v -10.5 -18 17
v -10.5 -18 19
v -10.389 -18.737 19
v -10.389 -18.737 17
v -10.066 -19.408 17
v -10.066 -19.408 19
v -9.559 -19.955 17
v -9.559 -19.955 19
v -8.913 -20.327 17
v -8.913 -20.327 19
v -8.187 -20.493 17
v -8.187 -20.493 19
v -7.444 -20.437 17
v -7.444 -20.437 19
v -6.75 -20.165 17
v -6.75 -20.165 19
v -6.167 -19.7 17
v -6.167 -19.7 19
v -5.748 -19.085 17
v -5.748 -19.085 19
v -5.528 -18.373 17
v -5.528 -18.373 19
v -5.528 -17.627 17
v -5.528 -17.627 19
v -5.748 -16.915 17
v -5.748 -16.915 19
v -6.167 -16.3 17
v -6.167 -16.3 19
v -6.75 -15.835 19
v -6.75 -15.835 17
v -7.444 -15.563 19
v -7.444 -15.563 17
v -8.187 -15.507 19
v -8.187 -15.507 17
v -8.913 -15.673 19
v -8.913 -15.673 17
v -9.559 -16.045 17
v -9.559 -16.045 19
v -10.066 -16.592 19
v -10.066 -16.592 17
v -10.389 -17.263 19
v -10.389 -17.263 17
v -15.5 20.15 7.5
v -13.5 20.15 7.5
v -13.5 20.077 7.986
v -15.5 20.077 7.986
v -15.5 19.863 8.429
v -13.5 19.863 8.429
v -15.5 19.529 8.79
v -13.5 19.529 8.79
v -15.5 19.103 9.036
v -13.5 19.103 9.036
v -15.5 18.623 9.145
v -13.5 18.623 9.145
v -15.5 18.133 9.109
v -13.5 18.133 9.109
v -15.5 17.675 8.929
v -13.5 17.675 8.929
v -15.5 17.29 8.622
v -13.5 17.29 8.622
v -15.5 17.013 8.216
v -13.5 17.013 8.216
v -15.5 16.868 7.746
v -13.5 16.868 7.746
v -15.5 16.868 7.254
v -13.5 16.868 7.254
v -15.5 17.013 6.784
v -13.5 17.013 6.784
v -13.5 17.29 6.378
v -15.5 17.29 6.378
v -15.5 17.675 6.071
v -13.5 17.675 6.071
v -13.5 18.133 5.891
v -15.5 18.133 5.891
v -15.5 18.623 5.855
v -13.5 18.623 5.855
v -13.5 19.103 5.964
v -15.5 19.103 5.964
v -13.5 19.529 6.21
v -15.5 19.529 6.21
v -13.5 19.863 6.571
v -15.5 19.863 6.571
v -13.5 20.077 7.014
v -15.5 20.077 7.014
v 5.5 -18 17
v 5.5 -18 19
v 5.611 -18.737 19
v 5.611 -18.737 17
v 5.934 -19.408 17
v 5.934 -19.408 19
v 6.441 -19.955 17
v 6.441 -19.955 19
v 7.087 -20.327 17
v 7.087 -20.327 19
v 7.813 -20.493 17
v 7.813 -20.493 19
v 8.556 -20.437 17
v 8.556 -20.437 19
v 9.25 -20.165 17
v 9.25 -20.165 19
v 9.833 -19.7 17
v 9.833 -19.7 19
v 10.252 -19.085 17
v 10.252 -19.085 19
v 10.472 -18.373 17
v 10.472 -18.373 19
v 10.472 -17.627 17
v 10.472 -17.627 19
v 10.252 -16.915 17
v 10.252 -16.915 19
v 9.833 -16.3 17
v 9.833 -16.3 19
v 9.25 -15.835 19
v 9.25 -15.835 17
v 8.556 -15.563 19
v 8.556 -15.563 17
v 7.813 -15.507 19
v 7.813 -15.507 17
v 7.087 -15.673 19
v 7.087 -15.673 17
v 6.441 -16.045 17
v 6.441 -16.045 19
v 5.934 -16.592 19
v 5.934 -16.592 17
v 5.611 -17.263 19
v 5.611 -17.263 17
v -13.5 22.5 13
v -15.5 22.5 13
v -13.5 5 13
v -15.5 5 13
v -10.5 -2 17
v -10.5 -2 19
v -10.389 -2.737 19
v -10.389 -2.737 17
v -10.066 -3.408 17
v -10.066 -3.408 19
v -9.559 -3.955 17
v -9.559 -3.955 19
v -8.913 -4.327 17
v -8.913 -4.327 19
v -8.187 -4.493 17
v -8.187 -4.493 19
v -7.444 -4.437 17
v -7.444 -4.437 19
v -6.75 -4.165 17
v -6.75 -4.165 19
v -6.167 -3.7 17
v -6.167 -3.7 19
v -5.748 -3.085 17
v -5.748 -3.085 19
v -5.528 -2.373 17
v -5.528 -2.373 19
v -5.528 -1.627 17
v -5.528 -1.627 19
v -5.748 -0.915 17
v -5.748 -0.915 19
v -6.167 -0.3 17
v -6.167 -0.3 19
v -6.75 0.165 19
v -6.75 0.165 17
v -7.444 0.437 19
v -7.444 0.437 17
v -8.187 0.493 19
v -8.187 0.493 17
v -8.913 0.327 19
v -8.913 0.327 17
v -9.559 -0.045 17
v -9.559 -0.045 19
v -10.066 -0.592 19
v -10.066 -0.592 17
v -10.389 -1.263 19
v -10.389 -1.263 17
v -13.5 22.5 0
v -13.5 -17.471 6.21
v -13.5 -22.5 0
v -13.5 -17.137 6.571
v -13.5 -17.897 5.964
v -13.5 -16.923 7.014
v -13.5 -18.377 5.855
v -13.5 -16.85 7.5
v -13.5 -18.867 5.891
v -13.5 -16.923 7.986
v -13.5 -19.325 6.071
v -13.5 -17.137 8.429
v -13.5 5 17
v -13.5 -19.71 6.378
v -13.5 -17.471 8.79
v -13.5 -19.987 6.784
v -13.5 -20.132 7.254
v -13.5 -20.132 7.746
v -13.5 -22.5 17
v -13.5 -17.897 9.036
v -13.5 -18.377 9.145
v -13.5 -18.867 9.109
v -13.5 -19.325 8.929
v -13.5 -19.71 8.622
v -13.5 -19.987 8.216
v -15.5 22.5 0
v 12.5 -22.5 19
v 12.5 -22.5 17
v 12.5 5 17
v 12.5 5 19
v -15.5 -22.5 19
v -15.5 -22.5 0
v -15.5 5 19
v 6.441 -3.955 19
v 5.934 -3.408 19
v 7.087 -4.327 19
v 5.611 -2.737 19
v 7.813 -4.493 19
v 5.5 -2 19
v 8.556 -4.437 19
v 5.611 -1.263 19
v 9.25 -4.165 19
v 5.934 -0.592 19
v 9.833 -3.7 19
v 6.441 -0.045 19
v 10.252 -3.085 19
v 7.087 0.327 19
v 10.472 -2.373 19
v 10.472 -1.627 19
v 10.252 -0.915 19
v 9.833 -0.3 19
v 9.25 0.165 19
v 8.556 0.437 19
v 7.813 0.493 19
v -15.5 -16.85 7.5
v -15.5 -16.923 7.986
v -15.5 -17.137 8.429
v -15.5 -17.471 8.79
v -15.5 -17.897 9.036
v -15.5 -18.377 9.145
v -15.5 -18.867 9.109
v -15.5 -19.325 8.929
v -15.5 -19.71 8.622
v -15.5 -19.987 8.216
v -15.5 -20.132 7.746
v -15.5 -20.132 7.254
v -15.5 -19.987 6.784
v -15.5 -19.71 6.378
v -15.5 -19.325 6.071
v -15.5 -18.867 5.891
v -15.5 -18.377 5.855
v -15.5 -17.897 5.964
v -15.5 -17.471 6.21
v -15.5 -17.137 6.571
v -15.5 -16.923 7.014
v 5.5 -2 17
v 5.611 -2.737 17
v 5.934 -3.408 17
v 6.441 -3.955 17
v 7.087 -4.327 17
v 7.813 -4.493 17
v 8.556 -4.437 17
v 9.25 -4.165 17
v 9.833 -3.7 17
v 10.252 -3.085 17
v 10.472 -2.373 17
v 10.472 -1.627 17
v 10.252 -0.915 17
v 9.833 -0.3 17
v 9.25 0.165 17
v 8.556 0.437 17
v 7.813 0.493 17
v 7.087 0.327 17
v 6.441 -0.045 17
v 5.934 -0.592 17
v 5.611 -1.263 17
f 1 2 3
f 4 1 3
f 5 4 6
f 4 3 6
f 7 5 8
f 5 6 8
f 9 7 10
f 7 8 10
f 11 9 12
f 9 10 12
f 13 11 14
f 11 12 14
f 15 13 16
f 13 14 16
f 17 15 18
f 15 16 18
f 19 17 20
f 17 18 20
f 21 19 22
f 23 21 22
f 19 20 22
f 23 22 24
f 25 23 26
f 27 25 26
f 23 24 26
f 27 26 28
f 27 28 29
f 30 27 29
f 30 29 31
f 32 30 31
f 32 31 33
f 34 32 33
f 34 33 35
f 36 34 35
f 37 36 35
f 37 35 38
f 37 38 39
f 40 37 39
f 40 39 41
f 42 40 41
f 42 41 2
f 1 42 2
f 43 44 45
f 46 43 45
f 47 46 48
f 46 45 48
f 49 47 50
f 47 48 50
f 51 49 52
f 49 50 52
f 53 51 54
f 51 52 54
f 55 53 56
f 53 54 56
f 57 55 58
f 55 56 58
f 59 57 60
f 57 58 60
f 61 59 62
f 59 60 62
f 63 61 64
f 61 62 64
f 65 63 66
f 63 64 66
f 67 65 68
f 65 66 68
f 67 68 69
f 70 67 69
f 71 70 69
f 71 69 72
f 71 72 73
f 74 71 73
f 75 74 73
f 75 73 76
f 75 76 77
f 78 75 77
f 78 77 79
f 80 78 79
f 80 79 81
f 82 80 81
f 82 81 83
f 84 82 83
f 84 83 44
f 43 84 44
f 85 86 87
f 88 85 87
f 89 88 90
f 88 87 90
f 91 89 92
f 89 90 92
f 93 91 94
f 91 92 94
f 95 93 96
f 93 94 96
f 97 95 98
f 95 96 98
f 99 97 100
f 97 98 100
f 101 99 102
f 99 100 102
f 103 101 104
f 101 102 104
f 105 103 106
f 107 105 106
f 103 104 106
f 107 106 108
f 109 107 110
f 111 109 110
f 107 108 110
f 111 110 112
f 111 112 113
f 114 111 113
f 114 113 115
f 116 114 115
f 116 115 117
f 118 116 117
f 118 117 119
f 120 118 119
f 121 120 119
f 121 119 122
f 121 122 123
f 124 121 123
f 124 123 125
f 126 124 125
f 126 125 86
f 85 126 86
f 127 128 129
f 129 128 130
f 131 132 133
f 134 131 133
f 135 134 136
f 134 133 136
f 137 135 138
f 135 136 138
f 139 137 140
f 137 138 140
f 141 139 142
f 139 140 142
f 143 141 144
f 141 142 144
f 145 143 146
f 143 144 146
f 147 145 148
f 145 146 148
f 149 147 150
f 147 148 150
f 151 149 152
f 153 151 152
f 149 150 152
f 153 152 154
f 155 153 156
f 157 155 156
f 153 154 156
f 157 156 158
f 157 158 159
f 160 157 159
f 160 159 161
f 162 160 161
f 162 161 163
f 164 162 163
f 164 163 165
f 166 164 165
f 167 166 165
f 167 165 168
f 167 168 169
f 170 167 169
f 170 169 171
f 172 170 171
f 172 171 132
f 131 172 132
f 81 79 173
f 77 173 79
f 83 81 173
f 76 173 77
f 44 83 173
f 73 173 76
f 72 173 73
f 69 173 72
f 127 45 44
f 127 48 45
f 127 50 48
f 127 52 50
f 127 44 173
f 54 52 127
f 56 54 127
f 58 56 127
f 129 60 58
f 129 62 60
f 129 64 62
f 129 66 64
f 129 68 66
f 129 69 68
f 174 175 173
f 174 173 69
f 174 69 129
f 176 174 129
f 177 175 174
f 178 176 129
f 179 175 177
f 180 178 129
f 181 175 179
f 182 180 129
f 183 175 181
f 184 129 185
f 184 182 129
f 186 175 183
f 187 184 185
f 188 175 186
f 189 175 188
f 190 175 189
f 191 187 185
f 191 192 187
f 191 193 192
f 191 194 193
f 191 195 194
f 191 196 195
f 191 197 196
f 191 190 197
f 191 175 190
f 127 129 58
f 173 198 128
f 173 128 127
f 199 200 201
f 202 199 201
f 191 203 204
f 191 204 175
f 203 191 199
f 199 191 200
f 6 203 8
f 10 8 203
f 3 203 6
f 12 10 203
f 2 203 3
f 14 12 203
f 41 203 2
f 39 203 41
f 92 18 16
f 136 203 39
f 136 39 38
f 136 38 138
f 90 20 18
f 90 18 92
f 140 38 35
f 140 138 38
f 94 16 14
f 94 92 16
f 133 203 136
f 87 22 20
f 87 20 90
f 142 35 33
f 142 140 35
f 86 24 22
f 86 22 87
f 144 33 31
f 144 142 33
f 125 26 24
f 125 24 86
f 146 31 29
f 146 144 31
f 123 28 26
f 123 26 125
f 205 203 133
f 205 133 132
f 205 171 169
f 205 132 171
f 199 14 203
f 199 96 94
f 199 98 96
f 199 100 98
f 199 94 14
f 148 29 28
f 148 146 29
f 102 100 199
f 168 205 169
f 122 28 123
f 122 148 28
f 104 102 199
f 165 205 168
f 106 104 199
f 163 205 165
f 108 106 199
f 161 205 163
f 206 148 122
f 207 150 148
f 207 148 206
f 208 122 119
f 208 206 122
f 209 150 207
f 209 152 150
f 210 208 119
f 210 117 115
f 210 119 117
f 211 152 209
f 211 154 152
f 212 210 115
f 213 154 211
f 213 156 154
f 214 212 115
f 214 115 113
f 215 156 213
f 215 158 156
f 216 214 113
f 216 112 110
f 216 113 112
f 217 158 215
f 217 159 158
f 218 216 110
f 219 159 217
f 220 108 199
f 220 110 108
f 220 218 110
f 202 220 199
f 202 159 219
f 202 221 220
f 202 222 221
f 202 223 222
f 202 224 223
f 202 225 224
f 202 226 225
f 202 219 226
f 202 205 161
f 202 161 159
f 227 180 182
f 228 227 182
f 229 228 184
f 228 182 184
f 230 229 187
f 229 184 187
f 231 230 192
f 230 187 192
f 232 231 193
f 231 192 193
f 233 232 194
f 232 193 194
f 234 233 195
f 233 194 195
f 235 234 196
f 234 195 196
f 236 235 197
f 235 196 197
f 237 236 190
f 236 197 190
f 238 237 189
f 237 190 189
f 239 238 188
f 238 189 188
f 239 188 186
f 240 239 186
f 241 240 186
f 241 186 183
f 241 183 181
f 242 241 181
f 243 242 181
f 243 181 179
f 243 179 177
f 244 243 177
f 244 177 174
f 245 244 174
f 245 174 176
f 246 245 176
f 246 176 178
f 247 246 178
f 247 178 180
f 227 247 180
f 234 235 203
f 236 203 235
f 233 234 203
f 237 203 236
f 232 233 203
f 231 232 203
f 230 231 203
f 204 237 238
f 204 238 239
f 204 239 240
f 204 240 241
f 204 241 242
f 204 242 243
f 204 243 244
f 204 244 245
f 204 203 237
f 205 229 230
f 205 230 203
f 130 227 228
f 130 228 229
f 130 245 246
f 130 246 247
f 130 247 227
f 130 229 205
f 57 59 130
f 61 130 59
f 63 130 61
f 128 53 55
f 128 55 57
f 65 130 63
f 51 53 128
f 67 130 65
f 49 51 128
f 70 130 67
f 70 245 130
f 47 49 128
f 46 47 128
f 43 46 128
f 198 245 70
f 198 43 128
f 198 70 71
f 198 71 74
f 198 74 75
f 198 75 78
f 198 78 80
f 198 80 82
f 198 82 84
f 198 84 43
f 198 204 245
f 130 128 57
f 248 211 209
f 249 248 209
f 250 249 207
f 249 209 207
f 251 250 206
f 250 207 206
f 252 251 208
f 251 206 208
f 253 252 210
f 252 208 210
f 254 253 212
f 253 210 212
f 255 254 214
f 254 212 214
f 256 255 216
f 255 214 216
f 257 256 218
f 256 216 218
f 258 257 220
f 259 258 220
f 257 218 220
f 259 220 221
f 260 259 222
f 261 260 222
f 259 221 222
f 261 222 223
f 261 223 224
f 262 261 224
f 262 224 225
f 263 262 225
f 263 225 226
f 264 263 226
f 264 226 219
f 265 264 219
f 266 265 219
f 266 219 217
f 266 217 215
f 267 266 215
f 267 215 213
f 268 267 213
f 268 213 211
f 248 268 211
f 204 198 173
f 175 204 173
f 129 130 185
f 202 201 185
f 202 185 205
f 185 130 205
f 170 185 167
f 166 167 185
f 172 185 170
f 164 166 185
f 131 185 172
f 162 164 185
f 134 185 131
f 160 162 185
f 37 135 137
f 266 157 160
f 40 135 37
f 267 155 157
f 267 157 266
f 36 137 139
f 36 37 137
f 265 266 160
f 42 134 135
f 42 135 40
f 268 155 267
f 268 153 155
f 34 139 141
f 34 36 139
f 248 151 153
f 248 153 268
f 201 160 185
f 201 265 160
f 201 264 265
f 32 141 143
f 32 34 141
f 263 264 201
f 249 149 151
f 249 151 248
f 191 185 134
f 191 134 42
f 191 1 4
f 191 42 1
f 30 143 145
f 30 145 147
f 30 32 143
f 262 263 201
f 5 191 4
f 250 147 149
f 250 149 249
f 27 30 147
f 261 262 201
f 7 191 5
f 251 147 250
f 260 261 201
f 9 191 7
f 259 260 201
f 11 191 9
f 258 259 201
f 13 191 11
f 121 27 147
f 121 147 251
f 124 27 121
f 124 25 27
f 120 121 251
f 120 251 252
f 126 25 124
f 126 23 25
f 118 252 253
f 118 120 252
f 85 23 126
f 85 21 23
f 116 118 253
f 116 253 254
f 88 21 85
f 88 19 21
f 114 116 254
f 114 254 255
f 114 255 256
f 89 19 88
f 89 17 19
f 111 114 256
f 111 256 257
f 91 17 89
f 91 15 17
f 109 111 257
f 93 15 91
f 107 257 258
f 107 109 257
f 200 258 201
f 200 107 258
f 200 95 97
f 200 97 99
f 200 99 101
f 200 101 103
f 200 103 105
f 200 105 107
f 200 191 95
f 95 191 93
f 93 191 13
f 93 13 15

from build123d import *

# Parameters (mm, degrees)
F0_W     = 28
F0_H     = 45
F1_DEPTH = 19
F2_D     = 5
F3_W     = 26
F3_H     = 17
F4_DEPTH = 45.001
F6_D     = 3.3
F7_W     = 17.5
F7_H     = 6
F8_DEPTH = 28.001


with BuildPart() as f1:
    # F0 (on Top) → F1 (new body)
    with BuildSketch(Plane.XY):
        with Locations((-1.5, 0)):
            Rectangle(F0_W, F0_H)
    extrude(amount=F1_DEPTH)

    # F2 (through all)
    with Locations(Plane(origin=(0, 0, 0), x_dir=(1, 0, 0), z_dir=(0, 0, -1))):
        with Locations((8, 2), (-8, 2), (-8, 18), (8, 18)):
            Hole(F2_D / 2)

    # F3 (on face) → F4 (cut, through all)
    with BuildSketch(Plane.XZ.offset(22.5)):
        with Locations((-0.5, 8.5)):
            Rectangle(F3_W, F3_H)
    extrude(amount=-F4_DEPTH, mode=Mode.SUBTRACT)

    # F6 (through all)
    with Locations(Plane(origin=(-15.5, 0, 0), x_dir=(0, -1, 0), z_dir=(-1, 0, 0))):
        with Locations((-18.5, 7.5), (18.5, 7.5)):
            Hole(F6_D / 2)

    # F7 (on face) → F8 (cut, through all)
    with BuildSketch(Plane(origin=(-15.5, 0, 0), x_dir=(0, -1, 0), z_dir=(-1, 0, 0))):
        with Locations((-13.75, 16)):
            Rectangle(F7_W, F7_H)
    extrude(amount=-F8_DEPTH, mode=Mode.SUBTRACT)


solid = f1.part
